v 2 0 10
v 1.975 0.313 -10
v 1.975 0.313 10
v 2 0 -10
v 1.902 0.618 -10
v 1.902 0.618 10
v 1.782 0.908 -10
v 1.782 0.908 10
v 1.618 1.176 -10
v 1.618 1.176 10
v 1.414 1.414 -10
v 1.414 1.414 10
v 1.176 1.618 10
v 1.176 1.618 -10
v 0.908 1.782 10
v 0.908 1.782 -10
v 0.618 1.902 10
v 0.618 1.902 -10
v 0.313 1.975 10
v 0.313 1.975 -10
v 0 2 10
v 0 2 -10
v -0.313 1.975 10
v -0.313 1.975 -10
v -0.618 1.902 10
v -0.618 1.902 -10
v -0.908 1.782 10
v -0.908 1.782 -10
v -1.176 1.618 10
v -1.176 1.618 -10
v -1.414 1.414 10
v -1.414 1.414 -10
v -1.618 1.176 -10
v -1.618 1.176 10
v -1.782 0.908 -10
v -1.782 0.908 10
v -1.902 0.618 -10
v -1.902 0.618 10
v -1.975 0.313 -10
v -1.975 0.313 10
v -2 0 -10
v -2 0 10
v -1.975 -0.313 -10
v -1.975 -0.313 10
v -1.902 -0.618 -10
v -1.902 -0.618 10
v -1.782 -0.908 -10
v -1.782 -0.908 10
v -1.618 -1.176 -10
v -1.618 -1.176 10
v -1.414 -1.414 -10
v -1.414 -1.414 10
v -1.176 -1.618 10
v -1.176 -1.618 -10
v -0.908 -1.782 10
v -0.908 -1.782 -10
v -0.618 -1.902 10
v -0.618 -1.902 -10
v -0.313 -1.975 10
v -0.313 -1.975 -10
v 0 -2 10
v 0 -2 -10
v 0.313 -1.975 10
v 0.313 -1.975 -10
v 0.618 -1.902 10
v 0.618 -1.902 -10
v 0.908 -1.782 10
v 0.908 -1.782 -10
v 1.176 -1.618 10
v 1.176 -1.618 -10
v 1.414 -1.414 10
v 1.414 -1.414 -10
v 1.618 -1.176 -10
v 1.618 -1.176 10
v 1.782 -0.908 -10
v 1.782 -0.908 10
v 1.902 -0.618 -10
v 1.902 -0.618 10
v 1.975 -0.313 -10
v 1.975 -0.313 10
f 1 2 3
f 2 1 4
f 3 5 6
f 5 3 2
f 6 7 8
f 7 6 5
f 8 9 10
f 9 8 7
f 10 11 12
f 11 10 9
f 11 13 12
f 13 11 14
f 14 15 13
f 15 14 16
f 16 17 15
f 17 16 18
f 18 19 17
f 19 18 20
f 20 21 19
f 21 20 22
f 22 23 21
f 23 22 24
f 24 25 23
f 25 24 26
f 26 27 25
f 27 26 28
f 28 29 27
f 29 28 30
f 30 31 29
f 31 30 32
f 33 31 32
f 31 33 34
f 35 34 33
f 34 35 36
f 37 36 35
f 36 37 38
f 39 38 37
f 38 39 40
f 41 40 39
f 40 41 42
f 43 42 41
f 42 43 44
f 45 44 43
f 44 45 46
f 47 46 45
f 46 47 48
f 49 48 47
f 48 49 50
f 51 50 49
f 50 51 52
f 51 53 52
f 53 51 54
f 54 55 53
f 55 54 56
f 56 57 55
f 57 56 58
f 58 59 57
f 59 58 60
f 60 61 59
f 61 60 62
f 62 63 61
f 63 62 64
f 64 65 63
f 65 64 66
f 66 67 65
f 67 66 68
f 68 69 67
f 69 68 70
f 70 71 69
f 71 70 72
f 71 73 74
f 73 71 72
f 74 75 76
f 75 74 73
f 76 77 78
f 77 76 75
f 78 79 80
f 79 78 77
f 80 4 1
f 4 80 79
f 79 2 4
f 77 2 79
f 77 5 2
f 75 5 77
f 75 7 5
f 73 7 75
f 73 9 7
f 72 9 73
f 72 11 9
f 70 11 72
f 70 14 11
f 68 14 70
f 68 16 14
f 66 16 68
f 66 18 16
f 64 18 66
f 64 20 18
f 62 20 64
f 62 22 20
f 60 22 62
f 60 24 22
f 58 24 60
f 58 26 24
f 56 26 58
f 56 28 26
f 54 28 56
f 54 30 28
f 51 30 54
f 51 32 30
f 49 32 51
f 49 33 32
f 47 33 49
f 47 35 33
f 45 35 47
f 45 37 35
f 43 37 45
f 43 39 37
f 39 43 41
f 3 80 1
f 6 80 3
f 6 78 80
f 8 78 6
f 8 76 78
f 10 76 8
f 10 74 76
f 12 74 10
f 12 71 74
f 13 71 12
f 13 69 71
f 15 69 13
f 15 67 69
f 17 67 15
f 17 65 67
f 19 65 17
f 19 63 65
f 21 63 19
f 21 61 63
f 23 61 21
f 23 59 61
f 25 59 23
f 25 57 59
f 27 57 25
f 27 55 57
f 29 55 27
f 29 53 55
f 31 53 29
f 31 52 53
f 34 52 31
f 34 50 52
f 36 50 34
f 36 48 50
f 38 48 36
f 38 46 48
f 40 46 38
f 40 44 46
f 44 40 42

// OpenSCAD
// Unit of length: Unit.MM
cylinder(h = 20.0, d = 4.0, center = true, $fn = 40);
